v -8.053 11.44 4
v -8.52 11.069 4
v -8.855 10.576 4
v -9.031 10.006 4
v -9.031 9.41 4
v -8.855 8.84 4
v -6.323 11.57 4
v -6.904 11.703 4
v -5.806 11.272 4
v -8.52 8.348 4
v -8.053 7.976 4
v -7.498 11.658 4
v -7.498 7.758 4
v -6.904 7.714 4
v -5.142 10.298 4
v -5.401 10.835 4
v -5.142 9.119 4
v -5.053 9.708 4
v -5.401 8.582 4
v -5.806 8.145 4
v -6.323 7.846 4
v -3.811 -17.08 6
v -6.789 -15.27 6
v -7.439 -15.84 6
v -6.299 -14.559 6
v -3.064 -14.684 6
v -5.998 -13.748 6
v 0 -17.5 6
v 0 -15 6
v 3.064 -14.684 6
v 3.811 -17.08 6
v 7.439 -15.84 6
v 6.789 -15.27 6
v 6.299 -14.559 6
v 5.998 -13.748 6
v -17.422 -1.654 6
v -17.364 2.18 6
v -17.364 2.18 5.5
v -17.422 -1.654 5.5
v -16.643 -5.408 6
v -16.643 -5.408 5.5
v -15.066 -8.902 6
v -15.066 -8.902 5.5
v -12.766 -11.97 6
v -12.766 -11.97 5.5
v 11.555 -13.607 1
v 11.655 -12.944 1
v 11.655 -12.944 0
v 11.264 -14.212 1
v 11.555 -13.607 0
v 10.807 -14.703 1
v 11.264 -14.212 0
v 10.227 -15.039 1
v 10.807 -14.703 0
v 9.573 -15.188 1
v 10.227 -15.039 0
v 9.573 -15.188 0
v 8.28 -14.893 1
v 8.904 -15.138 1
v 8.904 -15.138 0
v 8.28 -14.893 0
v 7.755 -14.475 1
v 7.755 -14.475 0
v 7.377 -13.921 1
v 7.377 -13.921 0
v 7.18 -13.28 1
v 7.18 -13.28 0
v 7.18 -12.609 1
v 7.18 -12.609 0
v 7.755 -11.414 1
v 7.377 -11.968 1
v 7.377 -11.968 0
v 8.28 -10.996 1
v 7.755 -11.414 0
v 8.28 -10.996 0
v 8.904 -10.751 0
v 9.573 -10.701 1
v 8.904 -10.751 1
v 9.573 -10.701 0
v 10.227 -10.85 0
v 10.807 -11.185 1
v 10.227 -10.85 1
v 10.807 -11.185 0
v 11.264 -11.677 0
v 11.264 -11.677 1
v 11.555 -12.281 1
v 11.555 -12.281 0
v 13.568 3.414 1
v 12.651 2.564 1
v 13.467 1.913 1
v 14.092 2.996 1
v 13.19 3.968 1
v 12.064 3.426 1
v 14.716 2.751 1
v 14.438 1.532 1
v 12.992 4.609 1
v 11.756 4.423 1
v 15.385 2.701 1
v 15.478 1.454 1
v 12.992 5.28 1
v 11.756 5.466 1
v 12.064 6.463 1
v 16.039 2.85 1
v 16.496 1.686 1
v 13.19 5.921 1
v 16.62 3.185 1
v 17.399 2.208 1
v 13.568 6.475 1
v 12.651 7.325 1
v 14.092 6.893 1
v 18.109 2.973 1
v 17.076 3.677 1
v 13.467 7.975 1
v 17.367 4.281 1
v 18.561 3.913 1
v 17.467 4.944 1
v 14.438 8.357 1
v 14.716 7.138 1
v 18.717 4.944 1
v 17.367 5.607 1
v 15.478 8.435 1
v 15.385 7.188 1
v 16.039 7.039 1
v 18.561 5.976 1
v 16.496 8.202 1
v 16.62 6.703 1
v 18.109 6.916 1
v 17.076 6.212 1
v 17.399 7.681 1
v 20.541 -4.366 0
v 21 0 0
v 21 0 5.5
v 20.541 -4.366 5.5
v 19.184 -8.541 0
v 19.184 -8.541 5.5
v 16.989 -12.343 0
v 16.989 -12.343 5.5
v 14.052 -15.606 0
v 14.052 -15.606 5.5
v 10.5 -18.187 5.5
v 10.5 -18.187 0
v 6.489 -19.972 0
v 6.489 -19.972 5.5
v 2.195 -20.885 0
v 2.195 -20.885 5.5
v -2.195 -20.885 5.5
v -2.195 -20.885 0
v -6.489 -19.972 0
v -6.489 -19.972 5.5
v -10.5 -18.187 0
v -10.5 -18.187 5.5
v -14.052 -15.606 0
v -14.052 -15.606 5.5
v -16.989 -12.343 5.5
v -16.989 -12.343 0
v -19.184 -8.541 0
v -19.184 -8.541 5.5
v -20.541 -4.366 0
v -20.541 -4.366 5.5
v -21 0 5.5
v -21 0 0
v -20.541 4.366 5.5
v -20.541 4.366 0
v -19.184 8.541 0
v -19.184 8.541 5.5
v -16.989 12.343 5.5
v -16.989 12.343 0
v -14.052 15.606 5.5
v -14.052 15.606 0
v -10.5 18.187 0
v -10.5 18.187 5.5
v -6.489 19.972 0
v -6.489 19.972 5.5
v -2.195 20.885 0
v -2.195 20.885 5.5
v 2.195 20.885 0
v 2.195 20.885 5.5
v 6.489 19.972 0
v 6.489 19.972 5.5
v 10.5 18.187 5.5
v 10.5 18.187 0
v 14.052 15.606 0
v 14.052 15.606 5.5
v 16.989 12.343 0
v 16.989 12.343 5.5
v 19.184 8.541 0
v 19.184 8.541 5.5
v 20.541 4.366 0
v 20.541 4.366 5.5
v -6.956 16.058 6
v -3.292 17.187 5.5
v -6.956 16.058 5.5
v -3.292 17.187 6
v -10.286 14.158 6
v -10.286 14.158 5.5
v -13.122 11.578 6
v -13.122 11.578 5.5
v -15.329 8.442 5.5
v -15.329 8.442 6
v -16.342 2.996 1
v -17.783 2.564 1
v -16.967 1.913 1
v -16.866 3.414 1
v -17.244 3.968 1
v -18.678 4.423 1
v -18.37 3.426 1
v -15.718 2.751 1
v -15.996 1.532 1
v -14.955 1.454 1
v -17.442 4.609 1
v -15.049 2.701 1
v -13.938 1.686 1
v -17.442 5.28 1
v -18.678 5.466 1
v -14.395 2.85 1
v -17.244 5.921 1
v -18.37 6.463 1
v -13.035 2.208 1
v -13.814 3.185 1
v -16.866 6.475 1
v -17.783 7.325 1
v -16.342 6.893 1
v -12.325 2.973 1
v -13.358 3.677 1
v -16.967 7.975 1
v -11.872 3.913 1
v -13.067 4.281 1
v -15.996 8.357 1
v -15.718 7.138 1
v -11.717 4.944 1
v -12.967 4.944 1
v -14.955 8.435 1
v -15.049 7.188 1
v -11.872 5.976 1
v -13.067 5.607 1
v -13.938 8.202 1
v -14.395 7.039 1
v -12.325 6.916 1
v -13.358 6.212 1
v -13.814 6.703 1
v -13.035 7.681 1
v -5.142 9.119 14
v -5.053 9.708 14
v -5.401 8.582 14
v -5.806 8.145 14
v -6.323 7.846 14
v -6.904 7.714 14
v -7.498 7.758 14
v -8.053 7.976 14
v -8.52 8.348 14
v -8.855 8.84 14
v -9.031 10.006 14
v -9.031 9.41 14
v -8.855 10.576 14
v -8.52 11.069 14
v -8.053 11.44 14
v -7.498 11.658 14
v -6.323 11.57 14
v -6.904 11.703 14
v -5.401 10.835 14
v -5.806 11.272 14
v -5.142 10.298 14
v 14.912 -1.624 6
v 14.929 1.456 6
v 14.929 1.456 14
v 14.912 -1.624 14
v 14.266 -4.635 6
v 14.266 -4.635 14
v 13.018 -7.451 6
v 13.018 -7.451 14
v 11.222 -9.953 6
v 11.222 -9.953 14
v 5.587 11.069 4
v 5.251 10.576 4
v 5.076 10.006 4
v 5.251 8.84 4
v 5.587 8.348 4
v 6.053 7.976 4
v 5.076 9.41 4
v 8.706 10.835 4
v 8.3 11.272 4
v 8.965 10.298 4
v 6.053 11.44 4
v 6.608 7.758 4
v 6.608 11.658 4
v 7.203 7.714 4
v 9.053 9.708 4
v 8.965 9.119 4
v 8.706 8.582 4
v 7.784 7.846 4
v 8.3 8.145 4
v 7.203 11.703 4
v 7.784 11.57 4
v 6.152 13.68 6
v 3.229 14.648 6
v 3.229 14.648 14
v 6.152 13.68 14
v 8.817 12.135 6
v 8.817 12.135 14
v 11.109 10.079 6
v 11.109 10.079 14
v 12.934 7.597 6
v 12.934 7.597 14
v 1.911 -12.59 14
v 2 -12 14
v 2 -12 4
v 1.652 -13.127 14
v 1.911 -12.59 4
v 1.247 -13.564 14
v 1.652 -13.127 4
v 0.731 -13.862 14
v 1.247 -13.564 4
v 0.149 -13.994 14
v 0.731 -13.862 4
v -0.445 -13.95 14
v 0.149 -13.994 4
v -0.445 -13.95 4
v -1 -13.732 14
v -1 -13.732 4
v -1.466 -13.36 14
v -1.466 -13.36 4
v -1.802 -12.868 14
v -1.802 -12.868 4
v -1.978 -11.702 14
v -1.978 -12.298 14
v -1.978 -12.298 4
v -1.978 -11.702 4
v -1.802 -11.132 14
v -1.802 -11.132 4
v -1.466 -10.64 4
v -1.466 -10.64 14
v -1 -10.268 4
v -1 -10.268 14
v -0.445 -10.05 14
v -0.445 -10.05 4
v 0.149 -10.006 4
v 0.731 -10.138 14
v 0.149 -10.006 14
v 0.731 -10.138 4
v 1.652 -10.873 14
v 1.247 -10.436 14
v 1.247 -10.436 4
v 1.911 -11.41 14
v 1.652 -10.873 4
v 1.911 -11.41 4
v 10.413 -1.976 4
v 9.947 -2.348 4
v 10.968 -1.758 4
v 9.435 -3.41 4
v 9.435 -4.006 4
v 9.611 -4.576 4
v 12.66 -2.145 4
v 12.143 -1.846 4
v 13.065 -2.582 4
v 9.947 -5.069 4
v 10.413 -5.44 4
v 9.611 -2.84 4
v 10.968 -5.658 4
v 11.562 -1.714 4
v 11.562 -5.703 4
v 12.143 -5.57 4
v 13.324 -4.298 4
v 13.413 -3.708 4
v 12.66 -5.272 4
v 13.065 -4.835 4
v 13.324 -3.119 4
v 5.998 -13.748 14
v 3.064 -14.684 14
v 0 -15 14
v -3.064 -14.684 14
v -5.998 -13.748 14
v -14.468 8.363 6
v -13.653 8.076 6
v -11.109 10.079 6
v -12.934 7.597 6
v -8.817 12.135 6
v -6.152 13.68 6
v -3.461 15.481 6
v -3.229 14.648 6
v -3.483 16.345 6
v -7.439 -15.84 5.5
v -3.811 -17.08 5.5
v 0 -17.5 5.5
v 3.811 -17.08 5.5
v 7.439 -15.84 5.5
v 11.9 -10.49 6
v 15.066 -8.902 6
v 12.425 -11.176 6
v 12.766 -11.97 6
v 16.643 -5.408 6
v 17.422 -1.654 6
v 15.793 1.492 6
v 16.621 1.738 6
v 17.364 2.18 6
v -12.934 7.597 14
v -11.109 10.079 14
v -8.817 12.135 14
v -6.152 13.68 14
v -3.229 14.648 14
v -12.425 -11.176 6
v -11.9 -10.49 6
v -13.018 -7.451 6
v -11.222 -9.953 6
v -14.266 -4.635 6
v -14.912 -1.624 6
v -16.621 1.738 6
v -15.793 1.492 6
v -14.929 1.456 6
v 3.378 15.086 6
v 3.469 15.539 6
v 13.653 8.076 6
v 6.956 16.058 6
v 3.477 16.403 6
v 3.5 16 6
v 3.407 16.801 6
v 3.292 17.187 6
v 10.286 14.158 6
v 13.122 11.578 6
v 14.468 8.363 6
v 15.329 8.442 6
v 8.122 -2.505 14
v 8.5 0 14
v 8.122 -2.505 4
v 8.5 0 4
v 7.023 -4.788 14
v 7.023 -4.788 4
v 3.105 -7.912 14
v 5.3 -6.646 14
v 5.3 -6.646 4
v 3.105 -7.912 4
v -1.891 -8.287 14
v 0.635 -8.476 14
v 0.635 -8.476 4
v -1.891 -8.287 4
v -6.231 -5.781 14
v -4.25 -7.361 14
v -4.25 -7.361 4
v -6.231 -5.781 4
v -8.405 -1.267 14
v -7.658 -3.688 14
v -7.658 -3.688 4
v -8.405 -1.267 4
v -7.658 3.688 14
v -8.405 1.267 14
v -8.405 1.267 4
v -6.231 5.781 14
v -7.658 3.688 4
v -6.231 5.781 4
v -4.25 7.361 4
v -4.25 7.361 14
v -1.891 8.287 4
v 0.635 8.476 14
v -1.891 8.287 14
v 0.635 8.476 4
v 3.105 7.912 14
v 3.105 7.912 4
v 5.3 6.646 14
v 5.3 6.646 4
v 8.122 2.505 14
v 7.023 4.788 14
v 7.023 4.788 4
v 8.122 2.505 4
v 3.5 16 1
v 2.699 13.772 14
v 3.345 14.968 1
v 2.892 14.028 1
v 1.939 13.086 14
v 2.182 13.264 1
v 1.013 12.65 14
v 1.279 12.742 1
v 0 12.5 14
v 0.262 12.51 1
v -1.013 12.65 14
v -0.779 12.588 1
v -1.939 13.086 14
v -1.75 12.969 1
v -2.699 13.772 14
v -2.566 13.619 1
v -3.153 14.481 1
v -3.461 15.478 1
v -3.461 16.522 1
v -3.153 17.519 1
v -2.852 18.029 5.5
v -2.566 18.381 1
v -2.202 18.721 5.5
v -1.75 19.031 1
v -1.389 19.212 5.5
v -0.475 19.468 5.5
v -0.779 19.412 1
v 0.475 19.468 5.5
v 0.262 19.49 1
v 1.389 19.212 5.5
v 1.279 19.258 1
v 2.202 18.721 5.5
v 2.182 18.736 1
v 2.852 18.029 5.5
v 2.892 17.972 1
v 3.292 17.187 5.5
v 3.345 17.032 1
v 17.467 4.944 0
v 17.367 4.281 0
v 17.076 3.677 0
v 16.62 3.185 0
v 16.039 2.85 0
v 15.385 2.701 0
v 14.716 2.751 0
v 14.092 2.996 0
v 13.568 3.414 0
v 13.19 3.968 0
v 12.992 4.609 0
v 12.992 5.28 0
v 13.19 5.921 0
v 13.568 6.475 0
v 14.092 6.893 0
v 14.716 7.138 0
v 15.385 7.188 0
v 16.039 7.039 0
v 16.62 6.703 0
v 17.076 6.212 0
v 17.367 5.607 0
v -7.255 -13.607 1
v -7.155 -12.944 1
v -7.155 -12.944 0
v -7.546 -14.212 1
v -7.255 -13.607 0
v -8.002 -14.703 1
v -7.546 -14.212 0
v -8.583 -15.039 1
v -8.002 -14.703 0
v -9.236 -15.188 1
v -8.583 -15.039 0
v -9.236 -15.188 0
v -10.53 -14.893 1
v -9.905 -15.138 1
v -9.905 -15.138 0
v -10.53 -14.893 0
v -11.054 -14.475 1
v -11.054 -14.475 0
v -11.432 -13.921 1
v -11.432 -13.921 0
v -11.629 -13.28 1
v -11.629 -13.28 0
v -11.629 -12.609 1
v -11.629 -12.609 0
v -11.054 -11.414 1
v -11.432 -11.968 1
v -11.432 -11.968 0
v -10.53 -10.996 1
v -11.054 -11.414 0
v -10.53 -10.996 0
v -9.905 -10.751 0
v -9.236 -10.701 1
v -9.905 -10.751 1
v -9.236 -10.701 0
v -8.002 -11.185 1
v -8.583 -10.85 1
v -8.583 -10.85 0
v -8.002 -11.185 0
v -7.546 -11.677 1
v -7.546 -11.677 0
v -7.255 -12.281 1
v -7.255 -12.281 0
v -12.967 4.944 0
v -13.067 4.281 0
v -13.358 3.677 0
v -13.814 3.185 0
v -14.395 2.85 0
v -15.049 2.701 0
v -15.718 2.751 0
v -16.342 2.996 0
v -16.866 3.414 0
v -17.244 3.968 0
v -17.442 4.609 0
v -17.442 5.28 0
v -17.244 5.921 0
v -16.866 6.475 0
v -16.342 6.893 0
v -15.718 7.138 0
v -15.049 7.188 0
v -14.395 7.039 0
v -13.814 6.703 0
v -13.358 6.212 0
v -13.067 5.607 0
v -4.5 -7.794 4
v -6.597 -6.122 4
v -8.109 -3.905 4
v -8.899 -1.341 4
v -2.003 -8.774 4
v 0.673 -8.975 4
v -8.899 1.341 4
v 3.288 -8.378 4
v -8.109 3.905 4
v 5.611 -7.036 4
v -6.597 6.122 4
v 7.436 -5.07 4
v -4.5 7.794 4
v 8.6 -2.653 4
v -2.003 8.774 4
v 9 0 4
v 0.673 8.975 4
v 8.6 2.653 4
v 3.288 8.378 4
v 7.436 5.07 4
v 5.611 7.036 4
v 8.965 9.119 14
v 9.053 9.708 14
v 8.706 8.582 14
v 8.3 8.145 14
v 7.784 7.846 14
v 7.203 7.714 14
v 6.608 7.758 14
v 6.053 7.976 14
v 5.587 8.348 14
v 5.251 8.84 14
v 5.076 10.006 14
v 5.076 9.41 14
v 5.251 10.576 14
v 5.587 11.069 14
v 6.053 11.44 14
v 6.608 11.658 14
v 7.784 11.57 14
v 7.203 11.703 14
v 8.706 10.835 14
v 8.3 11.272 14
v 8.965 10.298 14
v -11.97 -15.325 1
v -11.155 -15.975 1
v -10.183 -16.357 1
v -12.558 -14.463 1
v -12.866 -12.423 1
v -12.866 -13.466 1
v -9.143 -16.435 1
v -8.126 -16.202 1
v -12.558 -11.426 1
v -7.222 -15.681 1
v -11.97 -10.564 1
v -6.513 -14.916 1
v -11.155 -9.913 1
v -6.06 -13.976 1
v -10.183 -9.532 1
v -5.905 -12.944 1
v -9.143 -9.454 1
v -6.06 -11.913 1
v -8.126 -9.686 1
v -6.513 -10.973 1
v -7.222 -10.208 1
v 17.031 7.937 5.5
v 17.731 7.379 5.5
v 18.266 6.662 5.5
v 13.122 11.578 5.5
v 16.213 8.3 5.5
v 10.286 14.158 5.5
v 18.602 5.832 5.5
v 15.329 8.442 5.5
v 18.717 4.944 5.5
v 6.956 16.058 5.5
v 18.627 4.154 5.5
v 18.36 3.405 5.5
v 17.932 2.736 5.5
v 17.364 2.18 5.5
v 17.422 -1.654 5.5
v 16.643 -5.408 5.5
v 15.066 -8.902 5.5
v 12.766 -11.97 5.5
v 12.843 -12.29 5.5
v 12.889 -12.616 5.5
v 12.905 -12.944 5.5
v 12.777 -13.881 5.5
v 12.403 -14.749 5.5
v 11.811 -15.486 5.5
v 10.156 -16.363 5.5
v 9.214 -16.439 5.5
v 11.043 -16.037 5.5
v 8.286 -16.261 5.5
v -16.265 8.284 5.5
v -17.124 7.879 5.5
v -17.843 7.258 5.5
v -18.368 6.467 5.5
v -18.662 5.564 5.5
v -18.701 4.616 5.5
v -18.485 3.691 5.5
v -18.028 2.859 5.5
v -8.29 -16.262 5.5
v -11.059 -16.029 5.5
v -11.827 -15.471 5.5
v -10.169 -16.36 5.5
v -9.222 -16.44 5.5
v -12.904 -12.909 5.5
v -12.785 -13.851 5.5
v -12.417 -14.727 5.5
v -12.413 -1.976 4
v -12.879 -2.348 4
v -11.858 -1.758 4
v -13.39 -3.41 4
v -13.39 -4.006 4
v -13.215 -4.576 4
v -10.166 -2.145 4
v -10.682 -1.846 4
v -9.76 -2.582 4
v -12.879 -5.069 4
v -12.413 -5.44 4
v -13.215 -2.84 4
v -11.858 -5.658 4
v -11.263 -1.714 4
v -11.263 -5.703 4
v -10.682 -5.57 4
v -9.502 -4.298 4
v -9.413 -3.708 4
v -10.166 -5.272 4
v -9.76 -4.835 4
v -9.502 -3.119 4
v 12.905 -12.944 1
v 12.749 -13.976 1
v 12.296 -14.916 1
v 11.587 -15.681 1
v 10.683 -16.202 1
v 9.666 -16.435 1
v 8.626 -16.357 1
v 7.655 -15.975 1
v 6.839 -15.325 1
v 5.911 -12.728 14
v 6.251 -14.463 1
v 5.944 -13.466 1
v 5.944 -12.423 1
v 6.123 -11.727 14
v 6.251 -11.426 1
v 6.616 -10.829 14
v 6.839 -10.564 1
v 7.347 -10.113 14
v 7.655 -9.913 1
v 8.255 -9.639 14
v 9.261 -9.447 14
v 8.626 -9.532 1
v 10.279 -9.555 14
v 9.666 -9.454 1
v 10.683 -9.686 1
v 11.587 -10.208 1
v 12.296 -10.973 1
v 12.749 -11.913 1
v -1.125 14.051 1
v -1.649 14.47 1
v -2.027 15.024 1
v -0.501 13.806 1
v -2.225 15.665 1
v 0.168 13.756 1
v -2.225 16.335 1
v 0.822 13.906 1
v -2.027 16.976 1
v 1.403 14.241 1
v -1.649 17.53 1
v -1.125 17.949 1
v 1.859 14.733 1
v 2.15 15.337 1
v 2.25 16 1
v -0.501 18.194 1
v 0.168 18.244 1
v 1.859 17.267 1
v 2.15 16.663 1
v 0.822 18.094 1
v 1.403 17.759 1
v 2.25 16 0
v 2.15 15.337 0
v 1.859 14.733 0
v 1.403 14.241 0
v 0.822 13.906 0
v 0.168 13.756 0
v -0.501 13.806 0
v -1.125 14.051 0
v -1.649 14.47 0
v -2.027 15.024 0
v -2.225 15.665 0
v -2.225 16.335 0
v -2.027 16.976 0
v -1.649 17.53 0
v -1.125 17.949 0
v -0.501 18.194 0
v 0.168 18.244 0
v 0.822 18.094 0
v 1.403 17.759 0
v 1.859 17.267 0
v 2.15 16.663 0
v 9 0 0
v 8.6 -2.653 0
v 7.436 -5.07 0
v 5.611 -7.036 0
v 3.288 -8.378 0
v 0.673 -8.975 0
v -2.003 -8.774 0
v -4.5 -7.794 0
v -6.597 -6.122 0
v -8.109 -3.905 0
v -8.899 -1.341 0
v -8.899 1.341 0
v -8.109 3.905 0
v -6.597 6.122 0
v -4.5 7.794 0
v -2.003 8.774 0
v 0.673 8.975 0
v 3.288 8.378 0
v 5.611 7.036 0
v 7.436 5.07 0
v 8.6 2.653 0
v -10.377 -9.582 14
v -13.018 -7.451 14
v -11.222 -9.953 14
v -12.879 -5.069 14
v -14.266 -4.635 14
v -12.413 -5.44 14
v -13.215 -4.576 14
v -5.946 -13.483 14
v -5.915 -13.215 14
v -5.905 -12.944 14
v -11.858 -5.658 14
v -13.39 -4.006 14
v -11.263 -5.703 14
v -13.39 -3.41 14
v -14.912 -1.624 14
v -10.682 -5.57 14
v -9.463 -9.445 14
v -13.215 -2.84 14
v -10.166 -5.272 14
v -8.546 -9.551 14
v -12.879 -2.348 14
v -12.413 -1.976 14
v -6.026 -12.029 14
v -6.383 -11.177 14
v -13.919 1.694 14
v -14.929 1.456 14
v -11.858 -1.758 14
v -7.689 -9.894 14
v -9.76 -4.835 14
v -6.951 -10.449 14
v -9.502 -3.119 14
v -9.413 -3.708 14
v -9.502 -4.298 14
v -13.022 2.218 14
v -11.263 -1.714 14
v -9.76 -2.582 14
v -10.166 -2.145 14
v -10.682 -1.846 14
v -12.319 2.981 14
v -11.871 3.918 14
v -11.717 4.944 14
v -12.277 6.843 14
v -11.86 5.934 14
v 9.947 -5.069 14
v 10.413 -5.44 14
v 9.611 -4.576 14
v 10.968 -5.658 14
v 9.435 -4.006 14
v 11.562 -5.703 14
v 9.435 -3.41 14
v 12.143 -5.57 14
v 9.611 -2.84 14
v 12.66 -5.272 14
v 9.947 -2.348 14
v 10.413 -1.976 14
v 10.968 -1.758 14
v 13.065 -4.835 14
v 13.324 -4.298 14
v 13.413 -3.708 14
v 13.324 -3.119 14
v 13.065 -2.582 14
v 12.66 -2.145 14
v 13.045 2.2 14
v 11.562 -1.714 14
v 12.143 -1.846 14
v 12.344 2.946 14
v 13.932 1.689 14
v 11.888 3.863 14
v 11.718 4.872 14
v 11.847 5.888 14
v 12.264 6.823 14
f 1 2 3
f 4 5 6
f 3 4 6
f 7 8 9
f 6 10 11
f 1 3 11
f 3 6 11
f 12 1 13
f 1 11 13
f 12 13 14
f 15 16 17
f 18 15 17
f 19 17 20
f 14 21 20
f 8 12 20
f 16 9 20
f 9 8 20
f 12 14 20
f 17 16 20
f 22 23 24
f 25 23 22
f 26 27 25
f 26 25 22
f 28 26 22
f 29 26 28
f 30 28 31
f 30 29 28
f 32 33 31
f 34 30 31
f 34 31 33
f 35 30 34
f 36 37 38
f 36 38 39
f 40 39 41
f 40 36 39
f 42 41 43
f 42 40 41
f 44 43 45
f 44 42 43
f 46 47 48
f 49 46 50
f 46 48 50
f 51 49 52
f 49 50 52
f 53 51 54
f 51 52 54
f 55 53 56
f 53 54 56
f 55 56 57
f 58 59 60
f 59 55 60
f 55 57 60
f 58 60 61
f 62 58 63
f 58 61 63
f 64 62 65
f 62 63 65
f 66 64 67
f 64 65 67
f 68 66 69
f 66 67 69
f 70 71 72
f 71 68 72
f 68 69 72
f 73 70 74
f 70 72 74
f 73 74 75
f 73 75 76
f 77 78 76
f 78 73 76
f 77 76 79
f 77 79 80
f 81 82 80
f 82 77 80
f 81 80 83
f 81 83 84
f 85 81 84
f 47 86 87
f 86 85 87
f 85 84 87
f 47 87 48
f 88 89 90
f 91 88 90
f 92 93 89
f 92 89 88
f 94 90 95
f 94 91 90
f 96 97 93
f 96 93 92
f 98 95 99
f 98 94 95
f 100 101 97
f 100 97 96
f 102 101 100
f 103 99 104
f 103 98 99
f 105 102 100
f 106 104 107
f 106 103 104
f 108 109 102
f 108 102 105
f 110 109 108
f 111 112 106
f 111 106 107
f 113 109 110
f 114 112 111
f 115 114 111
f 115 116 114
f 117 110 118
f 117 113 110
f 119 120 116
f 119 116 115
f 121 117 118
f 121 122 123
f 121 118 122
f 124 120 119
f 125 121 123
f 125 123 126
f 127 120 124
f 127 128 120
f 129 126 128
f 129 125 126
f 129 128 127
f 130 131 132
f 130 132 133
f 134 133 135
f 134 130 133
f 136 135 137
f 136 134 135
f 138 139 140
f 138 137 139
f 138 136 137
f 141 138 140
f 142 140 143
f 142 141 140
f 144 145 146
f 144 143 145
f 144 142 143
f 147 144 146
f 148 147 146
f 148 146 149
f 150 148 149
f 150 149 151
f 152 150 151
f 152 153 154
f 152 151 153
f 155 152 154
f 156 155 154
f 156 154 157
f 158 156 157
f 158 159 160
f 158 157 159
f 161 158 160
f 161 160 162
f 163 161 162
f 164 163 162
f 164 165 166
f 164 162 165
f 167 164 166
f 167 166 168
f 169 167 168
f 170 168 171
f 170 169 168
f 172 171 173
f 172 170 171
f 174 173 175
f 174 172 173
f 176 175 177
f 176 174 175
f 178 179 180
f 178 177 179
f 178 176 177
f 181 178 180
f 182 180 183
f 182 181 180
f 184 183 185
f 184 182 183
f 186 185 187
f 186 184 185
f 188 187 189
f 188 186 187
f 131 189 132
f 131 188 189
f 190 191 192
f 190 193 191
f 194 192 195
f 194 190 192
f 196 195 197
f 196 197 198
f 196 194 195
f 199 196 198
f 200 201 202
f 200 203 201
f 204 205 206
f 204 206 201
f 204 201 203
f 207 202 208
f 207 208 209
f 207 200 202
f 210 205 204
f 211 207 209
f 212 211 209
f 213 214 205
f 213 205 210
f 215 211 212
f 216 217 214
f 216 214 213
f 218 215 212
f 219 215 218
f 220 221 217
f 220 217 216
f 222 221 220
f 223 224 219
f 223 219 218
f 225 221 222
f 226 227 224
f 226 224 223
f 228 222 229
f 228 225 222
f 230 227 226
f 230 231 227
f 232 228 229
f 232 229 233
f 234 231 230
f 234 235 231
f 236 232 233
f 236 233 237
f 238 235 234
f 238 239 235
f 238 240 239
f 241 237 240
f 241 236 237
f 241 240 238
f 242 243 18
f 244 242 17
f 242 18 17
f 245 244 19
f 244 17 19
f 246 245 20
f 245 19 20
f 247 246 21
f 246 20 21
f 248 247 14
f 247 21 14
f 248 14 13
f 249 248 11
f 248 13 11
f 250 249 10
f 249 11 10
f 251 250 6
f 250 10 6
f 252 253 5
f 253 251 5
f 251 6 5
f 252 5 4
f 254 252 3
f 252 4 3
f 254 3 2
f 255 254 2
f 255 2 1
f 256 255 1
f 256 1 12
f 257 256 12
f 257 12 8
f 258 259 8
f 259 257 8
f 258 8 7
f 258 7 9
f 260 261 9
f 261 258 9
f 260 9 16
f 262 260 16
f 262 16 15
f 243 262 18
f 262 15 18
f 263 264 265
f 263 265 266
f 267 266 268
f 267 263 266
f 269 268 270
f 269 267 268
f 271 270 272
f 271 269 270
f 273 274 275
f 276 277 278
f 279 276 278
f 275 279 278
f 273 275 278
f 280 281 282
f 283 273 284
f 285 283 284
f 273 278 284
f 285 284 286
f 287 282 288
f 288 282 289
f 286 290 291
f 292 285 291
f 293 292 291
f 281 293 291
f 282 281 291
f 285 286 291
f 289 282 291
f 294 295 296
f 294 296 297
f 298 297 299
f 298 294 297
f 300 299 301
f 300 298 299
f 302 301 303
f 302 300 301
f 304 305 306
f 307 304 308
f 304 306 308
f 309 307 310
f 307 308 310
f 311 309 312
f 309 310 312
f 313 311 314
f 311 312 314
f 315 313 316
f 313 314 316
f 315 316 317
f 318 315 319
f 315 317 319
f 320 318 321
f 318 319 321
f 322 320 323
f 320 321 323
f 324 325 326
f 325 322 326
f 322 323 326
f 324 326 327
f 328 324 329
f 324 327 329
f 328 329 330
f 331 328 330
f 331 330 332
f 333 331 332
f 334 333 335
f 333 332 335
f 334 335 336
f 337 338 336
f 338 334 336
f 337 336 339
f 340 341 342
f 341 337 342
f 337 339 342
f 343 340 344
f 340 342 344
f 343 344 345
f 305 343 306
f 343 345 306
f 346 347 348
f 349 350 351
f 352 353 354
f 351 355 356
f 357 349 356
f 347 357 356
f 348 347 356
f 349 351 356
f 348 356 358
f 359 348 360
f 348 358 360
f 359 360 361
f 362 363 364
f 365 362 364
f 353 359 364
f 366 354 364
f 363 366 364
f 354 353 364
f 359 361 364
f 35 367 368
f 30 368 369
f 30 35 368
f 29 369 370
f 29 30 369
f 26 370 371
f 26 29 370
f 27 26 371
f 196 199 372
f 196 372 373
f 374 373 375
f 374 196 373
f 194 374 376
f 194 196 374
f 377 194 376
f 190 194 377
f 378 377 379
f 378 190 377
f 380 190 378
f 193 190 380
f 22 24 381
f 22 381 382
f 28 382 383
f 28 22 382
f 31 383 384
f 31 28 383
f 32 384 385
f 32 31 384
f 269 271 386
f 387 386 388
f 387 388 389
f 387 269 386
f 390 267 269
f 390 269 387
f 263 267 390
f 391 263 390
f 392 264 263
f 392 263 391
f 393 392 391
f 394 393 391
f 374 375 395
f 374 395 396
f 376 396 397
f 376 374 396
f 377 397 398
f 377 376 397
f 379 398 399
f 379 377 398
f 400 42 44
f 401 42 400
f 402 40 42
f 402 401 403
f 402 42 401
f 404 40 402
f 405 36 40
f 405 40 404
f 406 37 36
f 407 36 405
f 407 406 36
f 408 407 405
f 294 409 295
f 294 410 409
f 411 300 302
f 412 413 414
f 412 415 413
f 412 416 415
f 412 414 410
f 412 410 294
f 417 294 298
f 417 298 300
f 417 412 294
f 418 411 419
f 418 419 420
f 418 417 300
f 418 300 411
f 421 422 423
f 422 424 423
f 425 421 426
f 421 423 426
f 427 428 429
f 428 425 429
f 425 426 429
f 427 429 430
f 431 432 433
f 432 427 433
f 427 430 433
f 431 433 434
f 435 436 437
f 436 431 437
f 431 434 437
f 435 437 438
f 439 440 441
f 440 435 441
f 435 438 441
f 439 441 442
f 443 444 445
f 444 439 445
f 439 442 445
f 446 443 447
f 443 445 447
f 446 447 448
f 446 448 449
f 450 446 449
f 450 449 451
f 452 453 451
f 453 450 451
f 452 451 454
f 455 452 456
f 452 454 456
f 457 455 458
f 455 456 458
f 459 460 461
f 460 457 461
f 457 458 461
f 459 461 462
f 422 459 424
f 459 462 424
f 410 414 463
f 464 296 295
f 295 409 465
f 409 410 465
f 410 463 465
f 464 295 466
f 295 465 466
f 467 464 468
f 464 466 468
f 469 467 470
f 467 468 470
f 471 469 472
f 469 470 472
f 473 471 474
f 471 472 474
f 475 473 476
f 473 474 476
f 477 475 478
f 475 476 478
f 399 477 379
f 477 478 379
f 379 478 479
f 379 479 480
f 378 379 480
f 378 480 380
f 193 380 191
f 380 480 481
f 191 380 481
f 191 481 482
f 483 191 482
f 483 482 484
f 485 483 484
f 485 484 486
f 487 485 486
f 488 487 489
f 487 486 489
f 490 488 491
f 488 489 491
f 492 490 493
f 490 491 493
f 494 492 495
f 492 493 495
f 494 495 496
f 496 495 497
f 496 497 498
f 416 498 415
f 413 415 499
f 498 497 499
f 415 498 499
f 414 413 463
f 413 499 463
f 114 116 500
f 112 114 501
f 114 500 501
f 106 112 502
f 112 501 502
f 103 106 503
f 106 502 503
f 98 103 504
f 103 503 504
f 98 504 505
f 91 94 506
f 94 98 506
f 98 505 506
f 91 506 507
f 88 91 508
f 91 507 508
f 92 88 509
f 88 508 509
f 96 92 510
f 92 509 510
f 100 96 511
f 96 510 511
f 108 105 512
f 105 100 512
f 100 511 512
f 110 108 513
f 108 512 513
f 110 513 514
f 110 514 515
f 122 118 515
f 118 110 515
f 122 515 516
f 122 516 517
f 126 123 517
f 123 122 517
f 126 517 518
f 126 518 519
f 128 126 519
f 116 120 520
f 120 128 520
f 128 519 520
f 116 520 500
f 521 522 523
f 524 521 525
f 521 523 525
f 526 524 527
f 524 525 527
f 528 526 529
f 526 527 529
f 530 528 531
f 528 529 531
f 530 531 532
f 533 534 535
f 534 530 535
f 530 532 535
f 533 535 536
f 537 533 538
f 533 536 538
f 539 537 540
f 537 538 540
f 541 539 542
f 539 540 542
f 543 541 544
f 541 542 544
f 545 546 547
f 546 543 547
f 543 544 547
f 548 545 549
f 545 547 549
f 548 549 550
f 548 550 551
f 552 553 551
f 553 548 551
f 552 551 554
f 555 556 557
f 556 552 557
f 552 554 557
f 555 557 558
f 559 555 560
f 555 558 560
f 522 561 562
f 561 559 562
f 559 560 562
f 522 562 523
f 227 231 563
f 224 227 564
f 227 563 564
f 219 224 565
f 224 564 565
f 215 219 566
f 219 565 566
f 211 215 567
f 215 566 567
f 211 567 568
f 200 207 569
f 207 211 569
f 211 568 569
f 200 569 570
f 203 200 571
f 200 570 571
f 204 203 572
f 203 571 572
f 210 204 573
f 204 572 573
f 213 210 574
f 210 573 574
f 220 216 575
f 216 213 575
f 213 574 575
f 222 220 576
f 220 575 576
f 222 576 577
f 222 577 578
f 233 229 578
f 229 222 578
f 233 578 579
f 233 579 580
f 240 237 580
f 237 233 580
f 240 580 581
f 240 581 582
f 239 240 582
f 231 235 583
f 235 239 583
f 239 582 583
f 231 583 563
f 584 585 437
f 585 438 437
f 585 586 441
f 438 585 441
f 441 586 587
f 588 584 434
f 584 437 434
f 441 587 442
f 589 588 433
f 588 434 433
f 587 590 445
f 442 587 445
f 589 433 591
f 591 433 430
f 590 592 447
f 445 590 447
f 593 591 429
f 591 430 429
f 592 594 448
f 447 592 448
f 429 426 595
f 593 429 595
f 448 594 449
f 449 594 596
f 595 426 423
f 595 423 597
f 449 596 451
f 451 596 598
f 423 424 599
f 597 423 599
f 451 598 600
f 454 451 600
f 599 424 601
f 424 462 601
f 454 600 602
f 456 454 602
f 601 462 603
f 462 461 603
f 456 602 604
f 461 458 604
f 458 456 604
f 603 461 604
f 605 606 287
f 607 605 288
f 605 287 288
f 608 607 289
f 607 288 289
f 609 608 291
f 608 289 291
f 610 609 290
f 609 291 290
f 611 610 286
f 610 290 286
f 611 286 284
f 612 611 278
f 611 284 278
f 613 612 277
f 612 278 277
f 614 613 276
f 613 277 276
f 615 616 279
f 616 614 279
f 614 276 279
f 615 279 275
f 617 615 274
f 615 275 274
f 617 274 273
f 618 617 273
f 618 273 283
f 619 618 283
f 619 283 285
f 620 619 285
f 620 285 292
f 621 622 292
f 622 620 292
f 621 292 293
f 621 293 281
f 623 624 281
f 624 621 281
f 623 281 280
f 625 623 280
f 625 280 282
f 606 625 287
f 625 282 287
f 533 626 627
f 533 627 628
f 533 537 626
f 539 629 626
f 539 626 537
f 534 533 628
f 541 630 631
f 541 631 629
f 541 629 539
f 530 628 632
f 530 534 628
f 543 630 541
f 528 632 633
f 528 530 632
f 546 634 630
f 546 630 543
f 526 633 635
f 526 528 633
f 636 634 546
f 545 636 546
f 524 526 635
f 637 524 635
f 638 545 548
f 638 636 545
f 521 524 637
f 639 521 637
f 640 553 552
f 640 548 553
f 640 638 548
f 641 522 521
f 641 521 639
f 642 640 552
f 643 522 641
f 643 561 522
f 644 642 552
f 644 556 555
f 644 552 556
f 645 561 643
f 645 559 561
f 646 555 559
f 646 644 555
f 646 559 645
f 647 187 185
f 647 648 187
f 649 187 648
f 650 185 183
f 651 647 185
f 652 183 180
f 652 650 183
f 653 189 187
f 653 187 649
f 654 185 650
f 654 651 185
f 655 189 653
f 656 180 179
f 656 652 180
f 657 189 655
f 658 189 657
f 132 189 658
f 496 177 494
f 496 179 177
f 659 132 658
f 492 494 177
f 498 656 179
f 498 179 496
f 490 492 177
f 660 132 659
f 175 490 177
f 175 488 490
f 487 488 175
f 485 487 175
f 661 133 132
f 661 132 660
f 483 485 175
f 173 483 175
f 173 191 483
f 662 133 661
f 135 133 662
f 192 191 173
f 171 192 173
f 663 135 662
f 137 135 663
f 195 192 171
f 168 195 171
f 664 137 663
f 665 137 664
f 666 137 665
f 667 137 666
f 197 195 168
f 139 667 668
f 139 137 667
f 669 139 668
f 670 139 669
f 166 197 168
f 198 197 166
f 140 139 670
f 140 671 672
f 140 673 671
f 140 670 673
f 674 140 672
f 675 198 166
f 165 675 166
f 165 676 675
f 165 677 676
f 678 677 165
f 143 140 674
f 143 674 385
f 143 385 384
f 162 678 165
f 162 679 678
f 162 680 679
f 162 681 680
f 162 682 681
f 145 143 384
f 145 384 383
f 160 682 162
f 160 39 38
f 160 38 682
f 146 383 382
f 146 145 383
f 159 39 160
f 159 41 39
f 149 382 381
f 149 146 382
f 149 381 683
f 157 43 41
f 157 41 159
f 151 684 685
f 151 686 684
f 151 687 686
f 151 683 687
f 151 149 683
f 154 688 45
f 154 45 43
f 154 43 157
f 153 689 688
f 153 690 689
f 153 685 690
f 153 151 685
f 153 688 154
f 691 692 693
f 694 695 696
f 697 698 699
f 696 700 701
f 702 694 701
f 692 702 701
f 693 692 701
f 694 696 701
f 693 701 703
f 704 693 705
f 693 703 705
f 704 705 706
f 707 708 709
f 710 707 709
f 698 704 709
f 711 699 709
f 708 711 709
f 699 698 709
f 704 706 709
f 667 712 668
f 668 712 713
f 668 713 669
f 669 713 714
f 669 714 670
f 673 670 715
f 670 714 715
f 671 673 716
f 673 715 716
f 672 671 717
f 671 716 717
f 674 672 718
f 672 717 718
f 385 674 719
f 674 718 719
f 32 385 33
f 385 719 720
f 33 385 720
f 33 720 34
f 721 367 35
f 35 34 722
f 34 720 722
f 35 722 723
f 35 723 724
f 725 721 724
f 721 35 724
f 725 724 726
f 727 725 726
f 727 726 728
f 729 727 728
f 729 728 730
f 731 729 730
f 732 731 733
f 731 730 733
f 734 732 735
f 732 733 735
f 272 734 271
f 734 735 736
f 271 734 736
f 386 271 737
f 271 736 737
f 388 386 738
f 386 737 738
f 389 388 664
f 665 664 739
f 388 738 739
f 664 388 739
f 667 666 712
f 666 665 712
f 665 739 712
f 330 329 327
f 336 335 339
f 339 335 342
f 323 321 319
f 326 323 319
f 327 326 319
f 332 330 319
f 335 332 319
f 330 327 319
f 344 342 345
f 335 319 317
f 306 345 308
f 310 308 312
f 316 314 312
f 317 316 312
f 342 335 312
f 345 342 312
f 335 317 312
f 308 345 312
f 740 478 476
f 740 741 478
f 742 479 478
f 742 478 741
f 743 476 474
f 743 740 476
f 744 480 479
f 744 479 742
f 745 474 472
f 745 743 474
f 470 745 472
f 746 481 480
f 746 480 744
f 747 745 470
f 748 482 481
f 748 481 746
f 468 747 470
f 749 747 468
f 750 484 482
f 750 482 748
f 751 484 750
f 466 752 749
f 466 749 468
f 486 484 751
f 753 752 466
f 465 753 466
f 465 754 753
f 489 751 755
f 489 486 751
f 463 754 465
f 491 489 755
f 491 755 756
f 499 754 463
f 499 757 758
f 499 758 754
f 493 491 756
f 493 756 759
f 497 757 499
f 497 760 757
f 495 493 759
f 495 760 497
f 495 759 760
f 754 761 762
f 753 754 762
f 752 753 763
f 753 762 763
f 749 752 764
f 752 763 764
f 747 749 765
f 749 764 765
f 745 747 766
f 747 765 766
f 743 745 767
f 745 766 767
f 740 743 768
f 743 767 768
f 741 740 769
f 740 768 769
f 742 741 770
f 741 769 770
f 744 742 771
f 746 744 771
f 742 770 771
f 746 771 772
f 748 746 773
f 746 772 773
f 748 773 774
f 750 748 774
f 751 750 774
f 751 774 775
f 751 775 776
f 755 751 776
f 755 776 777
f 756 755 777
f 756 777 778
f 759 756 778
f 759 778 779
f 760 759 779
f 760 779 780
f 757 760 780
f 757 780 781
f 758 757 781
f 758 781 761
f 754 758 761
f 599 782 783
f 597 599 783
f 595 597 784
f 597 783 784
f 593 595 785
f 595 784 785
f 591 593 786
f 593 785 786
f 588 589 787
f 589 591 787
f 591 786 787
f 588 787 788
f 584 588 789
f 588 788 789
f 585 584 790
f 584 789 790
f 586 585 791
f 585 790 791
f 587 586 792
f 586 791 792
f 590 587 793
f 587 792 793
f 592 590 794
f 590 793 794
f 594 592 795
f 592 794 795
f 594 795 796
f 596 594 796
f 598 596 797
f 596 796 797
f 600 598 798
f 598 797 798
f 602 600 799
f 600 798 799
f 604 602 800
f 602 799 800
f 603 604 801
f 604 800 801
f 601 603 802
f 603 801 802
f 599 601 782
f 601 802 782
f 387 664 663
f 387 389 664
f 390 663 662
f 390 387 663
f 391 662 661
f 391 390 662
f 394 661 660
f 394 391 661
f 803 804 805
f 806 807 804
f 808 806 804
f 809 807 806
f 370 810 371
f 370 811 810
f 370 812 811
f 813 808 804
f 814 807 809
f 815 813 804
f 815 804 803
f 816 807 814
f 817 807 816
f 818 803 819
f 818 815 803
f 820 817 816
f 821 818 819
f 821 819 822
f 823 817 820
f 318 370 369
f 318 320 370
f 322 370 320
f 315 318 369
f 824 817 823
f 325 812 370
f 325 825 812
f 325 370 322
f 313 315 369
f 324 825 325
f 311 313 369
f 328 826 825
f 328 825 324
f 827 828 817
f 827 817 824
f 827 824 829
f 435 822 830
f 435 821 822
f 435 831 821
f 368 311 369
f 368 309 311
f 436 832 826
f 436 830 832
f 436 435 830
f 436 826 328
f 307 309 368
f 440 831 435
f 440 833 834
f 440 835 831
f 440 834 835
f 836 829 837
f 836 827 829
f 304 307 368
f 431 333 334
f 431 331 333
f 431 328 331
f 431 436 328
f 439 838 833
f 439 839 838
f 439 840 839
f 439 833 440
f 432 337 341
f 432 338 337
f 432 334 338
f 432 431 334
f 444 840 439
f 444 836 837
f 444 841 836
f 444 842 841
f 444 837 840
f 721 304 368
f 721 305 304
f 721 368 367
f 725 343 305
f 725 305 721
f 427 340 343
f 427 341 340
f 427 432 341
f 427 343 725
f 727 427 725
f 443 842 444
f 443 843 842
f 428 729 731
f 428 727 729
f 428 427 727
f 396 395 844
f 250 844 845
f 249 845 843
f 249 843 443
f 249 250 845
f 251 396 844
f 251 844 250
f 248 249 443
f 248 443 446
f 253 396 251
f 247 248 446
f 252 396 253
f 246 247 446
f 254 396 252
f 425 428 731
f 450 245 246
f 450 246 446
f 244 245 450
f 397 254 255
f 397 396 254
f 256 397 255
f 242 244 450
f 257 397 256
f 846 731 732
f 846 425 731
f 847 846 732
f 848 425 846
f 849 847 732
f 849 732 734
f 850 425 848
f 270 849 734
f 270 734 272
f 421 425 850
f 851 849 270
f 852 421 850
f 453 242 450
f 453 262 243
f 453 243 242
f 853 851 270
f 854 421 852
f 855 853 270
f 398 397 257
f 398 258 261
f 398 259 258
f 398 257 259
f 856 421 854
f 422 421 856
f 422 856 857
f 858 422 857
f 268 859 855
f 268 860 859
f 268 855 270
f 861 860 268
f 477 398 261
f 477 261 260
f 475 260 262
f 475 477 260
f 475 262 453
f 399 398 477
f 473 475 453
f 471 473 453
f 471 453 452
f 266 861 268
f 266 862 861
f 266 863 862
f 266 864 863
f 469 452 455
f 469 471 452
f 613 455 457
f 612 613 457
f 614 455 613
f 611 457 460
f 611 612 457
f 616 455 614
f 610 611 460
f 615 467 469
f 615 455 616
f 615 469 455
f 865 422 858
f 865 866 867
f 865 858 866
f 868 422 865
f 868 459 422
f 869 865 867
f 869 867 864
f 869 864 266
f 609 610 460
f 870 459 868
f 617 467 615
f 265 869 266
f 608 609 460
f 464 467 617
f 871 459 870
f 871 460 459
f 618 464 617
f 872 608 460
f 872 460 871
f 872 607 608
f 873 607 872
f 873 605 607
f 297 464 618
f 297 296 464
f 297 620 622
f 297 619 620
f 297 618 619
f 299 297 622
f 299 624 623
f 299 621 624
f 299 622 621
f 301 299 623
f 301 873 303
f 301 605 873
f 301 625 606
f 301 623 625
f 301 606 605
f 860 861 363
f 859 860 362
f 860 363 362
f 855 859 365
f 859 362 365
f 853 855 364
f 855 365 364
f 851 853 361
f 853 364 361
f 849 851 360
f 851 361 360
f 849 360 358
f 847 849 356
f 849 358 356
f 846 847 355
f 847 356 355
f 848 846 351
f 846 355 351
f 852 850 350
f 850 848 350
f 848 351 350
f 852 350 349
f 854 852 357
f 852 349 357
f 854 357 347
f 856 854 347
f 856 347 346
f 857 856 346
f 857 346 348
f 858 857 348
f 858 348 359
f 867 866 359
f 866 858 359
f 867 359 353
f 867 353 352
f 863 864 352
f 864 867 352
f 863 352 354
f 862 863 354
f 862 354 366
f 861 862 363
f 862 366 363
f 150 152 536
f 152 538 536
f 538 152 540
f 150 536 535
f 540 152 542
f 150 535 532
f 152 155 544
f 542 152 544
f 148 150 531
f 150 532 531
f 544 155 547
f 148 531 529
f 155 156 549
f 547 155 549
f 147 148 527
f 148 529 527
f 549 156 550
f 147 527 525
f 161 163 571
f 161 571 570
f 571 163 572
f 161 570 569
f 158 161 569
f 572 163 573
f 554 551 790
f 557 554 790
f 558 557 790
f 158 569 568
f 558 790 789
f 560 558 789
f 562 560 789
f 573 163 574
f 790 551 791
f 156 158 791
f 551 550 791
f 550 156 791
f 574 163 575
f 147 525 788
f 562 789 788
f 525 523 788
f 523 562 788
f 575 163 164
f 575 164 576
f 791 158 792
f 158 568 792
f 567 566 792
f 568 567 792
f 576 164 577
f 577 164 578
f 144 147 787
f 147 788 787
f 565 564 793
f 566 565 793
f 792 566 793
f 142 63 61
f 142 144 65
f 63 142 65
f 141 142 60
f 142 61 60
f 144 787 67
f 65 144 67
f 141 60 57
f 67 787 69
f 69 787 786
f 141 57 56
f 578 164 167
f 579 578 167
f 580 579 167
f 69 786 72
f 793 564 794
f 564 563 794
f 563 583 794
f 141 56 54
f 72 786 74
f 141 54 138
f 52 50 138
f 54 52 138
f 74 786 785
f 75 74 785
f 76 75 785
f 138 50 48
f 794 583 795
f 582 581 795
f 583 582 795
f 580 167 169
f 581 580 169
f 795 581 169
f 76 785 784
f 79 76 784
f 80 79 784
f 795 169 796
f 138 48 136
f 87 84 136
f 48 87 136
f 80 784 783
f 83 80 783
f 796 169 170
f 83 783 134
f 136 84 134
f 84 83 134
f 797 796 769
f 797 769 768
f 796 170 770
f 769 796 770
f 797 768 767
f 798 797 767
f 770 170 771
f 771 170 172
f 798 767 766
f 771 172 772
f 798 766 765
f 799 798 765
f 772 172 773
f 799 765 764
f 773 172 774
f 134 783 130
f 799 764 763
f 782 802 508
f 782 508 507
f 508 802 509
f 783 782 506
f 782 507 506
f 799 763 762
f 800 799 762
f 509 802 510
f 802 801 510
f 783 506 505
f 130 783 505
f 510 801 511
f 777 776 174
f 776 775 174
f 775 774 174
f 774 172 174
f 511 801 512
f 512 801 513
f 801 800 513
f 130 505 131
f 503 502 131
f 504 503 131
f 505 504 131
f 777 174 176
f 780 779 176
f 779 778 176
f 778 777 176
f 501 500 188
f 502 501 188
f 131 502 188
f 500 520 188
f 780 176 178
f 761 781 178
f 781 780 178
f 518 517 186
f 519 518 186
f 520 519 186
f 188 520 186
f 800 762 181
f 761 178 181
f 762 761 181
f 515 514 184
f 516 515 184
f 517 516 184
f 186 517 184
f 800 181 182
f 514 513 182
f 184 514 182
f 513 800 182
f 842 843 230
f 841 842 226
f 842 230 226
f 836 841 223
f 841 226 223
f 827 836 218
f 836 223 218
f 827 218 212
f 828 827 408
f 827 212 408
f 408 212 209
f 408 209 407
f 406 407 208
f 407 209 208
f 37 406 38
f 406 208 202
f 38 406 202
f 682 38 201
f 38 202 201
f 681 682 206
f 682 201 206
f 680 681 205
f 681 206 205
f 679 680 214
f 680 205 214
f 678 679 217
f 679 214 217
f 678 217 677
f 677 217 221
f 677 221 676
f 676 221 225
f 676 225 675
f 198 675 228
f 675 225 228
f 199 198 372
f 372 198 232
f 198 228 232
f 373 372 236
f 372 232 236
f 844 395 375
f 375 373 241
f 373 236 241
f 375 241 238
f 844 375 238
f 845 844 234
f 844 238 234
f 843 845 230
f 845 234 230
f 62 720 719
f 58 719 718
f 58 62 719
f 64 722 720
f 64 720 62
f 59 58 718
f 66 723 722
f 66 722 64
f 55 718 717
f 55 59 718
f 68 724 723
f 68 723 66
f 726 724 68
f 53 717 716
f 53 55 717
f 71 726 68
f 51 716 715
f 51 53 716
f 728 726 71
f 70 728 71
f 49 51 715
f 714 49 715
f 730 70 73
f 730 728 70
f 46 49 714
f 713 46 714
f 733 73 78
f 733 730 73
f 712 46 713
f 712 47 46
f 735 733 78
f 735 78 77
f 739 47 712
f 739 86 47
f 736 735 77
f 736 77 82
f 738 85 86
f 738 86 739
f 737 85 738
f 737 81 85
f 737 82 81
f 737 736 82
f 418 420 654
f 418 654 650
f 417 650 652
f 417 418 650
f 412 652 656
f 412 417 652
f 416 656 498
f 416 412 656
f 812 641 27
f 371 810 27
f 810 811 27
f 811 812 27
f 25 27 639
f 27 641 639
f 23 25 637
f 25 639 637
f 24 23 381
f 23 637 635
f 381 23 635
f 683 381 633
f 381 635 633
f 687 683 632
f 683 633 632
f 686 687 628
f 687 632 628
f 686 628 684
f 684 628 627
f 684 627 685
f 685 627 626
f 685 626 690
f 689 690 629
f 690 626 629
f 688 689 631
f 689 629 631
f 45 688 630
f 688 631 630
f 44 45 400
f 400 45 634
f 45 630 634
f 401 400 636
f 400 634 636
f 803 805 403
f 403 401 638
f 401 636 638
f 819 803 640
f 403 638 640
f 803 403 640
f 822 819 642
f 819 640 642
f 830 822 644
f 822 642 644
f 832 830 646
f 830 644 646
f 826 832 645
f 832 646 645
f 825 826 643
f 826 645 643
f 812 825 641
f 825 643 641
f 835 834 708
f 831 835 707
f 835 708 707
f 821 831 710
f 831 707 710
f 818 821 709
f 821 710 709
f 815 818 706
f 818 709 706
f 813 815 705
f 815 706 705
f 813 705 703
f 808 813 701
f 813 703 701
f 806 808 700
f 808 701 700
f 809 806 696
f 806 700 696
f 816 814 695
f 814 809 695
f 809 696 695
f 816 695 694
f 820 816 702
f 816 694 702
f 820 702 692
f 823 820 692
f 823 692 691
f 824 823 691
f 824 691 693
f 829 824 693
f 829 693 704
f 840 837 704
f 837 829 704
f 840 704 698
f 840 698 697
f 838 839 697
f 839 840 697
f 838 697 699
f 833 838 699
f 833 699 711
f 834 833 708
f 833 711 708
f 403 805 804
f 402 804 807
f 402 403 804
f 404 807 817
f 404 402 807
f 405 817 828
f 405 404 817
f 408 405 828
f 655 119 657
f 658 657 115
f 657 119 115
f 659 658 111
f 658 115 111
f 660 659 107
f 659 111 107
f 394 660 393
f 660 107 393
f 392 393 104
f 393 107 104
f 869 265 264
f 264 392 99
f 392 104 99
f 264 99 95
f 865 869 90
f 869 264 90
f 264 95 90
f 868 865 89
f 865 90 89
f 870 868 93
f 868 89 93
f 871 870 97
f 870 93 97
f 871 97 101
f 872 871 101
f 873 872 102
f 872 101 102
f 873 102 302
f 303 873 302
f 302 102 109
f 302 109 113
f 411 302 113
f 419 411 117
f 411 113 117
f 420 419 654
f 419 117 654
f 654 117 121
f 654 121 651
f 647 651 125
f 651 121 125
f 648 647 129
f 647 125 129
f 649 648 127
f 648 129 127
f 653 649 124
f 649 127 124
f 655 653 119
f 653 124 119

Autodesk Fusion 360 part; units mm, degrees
sketch "Sketch1" plane through (0, 0, 0) normal (0, 0, 1) x (1, 0, 0)
  circle A0 centre (0, 0) radius 9
  circle A1 centre (0, 0) radius 16 construction
  line L0 (0, 0) -> (0, 16) construction
  circle A2 centre (0, 16) radius 3.5
  circle A3 centre (-15.2169, 4.9443) radius 3.5
  circle A4 centre (-9.4046, -12.9443) radius 3.5
  circle A5 centre (9.4046, -12.9443) radius 3.5
  circle A6 centre (15.2169, 4.9443) radius 3.5
  circle A7 centre (0, 0) radius 15
  circle A8 centre (0, 0) radius 21
  circle A9 centre (0, 0) radius 12 construction
  line L1 (0, 0) -> (-8.8168, 12.1353) construction
  circle A10 centre (-7.0534, 9.7082) radius 2
  circle A11 centre (-7.0534, 9.7082) radius 2.25 construction
  circle A12 centre (-11.4127, -3.7082) radius 2
  circle A13 centre (0, -12) radius 2
  circle A14 centre (11.4127, -3.7082) radius 2
  circle A15 centre (7.0534, 9.7082) radius 2
  line L2 (0, 0) -> (-15.2169, 4.9443) construction
  circle A16 centre (0, 16) radius 2.25
  circle A17 centre (-15.2169, 4.9443) radius 2.25
  circle A18 centre (-9.4046, -12.9443) radius 2.25
  circle A19 centre (9.4046, -12.9443) radius 2.25
  circle A20 centre (15.2169, 4.9443) radius 2.25
  circle A21 centre (0, 0) radius 8.5
  dimension "d1" = 18
  dimension "d3" = 7
  dimension "d5" = 360
  dimension "d6" = 30
  dimension "d7" = 42
  dimension "d8" = 4
  dimension "d9" = 4.5
  dimension "d10" = 24
  dimension "d12" = 360
  dimension "d13" = 36
  dimension "d14" = 72
  dimension "d17" = 4.5
  dimension "d19" = 360
  dimension "d26" = 17
  dimension "d31" = 32
extrude "Extrude1" add sketch "Sketch1" along normal blind 6 contours A2 A3 A4 A5 A6 A7 | A8
extrude "Extrude6" add sketch "Sketch1" along normal blind 14 contours A2 A3 A4 A5 A6 A7
extrude "Extrude7" add sketch "Sketch1" along normal blind 1 contours A2 A7 A16 | A2 A7 A16 | A3 A7 A17 | A3 A7 A17 | A6 A7 A20 | A6 A7 A20 | A4 A7 A18 | A4 A7 A18 | A5 A7 A19 | A5 A7 A19
extrude "Extrude4" add sketch "Sketch1" along normal blind 14 contours A0
extrude "Extrude5" cut sketch "Sketch1" along normal blind 4 contours A0
sketch "Sketch2" plane through (0, 0, 6) normal (0, 0, 1) x (-1, 0, 0)
  circle A0 centre (0, 0) radius 21
  arc A1 (-12.9338, -7.5971) -> (-3.2285, -14.6484) centre (0, 0) ccw
  arc A2 (-14.9292, -1.4561) -> (-12.9338, -7.5971) centre (-15.2169, -4.9443) ccw
  arc A3 (-11.2221, 9.9532) -> (-14.9292, -1.4561) centre (0, 0) ccw
  arc A4 (-5.9982, 13.7485) -> (-11.2221, 9.9532) centre (-9.4046, 12.9443) ccw
  arc A5 (5.9982, 13.7485) -> (-5.9982, 13.7485) centre (0, 0) ccw
  arc A6 (11.2221, 9.9532) -> (5.9982, 13.7485) centre (9.4046, 12.9443) ccw
  arc A7 (14.9292, -1.4561) -> (11.2221, 9.9532) centre (0, 0) ccw
  arc A8 (12.9338, -7.5971) -> (14.9292, -1.4561) centre (15.2169, -4.9443) ccw
  arc A9 (3.2285, -14.6484) -> (12.9338, -7.5971) centre (0, 0) ccw
  arc A10 (-3.2285, -14.6484) -> (3.2285, -14.6484) centre (0, -16) ccw
  circle A11 centre (0, 0) radius 17.5
  dimension "d36" = 35
extrude "Extrude8" cut sketch "Sketch2" against normal blind 0.5
sketch "Sketch3" plane through (0, 0, 0) normal (0, 0, -1) x (1, 0, 0)
  circle A0 centre (0, 0) radius 9
  circle A1 centre (-9.4046, 12.9443) radius 2.25
  circle A2 centre (-15.2169, -4.9443) radius 2.25
  circle A3 centre (9.4046, 12.9443) radius 2.25
  circle A4 centre (0, -16) radius 2.25
  circle A5 centre (15.2169, -4.9443) radius 2.25
  circle A6 centre (-7.0534, -9.7082) radius 2
  circle A7 centre (11.4127, 3.7082) radius 2
  circle A8 centre (0, 12) radius 2
  circle A9 centre (7.0534, -9.7082) radius 2
  circle A10 centre (-11.4127, 3.7082) radius 2
  circle A11 centre (0, 0) radius 21
extrude "Extrude9" add sketch "Sketch3" against normal blind 4 contours A6 | A7 | A8 | A9 | A10
equation "d10 = ( d6 - d1 ) / 2 + d1"
equation "d13 = d14 / 2"
